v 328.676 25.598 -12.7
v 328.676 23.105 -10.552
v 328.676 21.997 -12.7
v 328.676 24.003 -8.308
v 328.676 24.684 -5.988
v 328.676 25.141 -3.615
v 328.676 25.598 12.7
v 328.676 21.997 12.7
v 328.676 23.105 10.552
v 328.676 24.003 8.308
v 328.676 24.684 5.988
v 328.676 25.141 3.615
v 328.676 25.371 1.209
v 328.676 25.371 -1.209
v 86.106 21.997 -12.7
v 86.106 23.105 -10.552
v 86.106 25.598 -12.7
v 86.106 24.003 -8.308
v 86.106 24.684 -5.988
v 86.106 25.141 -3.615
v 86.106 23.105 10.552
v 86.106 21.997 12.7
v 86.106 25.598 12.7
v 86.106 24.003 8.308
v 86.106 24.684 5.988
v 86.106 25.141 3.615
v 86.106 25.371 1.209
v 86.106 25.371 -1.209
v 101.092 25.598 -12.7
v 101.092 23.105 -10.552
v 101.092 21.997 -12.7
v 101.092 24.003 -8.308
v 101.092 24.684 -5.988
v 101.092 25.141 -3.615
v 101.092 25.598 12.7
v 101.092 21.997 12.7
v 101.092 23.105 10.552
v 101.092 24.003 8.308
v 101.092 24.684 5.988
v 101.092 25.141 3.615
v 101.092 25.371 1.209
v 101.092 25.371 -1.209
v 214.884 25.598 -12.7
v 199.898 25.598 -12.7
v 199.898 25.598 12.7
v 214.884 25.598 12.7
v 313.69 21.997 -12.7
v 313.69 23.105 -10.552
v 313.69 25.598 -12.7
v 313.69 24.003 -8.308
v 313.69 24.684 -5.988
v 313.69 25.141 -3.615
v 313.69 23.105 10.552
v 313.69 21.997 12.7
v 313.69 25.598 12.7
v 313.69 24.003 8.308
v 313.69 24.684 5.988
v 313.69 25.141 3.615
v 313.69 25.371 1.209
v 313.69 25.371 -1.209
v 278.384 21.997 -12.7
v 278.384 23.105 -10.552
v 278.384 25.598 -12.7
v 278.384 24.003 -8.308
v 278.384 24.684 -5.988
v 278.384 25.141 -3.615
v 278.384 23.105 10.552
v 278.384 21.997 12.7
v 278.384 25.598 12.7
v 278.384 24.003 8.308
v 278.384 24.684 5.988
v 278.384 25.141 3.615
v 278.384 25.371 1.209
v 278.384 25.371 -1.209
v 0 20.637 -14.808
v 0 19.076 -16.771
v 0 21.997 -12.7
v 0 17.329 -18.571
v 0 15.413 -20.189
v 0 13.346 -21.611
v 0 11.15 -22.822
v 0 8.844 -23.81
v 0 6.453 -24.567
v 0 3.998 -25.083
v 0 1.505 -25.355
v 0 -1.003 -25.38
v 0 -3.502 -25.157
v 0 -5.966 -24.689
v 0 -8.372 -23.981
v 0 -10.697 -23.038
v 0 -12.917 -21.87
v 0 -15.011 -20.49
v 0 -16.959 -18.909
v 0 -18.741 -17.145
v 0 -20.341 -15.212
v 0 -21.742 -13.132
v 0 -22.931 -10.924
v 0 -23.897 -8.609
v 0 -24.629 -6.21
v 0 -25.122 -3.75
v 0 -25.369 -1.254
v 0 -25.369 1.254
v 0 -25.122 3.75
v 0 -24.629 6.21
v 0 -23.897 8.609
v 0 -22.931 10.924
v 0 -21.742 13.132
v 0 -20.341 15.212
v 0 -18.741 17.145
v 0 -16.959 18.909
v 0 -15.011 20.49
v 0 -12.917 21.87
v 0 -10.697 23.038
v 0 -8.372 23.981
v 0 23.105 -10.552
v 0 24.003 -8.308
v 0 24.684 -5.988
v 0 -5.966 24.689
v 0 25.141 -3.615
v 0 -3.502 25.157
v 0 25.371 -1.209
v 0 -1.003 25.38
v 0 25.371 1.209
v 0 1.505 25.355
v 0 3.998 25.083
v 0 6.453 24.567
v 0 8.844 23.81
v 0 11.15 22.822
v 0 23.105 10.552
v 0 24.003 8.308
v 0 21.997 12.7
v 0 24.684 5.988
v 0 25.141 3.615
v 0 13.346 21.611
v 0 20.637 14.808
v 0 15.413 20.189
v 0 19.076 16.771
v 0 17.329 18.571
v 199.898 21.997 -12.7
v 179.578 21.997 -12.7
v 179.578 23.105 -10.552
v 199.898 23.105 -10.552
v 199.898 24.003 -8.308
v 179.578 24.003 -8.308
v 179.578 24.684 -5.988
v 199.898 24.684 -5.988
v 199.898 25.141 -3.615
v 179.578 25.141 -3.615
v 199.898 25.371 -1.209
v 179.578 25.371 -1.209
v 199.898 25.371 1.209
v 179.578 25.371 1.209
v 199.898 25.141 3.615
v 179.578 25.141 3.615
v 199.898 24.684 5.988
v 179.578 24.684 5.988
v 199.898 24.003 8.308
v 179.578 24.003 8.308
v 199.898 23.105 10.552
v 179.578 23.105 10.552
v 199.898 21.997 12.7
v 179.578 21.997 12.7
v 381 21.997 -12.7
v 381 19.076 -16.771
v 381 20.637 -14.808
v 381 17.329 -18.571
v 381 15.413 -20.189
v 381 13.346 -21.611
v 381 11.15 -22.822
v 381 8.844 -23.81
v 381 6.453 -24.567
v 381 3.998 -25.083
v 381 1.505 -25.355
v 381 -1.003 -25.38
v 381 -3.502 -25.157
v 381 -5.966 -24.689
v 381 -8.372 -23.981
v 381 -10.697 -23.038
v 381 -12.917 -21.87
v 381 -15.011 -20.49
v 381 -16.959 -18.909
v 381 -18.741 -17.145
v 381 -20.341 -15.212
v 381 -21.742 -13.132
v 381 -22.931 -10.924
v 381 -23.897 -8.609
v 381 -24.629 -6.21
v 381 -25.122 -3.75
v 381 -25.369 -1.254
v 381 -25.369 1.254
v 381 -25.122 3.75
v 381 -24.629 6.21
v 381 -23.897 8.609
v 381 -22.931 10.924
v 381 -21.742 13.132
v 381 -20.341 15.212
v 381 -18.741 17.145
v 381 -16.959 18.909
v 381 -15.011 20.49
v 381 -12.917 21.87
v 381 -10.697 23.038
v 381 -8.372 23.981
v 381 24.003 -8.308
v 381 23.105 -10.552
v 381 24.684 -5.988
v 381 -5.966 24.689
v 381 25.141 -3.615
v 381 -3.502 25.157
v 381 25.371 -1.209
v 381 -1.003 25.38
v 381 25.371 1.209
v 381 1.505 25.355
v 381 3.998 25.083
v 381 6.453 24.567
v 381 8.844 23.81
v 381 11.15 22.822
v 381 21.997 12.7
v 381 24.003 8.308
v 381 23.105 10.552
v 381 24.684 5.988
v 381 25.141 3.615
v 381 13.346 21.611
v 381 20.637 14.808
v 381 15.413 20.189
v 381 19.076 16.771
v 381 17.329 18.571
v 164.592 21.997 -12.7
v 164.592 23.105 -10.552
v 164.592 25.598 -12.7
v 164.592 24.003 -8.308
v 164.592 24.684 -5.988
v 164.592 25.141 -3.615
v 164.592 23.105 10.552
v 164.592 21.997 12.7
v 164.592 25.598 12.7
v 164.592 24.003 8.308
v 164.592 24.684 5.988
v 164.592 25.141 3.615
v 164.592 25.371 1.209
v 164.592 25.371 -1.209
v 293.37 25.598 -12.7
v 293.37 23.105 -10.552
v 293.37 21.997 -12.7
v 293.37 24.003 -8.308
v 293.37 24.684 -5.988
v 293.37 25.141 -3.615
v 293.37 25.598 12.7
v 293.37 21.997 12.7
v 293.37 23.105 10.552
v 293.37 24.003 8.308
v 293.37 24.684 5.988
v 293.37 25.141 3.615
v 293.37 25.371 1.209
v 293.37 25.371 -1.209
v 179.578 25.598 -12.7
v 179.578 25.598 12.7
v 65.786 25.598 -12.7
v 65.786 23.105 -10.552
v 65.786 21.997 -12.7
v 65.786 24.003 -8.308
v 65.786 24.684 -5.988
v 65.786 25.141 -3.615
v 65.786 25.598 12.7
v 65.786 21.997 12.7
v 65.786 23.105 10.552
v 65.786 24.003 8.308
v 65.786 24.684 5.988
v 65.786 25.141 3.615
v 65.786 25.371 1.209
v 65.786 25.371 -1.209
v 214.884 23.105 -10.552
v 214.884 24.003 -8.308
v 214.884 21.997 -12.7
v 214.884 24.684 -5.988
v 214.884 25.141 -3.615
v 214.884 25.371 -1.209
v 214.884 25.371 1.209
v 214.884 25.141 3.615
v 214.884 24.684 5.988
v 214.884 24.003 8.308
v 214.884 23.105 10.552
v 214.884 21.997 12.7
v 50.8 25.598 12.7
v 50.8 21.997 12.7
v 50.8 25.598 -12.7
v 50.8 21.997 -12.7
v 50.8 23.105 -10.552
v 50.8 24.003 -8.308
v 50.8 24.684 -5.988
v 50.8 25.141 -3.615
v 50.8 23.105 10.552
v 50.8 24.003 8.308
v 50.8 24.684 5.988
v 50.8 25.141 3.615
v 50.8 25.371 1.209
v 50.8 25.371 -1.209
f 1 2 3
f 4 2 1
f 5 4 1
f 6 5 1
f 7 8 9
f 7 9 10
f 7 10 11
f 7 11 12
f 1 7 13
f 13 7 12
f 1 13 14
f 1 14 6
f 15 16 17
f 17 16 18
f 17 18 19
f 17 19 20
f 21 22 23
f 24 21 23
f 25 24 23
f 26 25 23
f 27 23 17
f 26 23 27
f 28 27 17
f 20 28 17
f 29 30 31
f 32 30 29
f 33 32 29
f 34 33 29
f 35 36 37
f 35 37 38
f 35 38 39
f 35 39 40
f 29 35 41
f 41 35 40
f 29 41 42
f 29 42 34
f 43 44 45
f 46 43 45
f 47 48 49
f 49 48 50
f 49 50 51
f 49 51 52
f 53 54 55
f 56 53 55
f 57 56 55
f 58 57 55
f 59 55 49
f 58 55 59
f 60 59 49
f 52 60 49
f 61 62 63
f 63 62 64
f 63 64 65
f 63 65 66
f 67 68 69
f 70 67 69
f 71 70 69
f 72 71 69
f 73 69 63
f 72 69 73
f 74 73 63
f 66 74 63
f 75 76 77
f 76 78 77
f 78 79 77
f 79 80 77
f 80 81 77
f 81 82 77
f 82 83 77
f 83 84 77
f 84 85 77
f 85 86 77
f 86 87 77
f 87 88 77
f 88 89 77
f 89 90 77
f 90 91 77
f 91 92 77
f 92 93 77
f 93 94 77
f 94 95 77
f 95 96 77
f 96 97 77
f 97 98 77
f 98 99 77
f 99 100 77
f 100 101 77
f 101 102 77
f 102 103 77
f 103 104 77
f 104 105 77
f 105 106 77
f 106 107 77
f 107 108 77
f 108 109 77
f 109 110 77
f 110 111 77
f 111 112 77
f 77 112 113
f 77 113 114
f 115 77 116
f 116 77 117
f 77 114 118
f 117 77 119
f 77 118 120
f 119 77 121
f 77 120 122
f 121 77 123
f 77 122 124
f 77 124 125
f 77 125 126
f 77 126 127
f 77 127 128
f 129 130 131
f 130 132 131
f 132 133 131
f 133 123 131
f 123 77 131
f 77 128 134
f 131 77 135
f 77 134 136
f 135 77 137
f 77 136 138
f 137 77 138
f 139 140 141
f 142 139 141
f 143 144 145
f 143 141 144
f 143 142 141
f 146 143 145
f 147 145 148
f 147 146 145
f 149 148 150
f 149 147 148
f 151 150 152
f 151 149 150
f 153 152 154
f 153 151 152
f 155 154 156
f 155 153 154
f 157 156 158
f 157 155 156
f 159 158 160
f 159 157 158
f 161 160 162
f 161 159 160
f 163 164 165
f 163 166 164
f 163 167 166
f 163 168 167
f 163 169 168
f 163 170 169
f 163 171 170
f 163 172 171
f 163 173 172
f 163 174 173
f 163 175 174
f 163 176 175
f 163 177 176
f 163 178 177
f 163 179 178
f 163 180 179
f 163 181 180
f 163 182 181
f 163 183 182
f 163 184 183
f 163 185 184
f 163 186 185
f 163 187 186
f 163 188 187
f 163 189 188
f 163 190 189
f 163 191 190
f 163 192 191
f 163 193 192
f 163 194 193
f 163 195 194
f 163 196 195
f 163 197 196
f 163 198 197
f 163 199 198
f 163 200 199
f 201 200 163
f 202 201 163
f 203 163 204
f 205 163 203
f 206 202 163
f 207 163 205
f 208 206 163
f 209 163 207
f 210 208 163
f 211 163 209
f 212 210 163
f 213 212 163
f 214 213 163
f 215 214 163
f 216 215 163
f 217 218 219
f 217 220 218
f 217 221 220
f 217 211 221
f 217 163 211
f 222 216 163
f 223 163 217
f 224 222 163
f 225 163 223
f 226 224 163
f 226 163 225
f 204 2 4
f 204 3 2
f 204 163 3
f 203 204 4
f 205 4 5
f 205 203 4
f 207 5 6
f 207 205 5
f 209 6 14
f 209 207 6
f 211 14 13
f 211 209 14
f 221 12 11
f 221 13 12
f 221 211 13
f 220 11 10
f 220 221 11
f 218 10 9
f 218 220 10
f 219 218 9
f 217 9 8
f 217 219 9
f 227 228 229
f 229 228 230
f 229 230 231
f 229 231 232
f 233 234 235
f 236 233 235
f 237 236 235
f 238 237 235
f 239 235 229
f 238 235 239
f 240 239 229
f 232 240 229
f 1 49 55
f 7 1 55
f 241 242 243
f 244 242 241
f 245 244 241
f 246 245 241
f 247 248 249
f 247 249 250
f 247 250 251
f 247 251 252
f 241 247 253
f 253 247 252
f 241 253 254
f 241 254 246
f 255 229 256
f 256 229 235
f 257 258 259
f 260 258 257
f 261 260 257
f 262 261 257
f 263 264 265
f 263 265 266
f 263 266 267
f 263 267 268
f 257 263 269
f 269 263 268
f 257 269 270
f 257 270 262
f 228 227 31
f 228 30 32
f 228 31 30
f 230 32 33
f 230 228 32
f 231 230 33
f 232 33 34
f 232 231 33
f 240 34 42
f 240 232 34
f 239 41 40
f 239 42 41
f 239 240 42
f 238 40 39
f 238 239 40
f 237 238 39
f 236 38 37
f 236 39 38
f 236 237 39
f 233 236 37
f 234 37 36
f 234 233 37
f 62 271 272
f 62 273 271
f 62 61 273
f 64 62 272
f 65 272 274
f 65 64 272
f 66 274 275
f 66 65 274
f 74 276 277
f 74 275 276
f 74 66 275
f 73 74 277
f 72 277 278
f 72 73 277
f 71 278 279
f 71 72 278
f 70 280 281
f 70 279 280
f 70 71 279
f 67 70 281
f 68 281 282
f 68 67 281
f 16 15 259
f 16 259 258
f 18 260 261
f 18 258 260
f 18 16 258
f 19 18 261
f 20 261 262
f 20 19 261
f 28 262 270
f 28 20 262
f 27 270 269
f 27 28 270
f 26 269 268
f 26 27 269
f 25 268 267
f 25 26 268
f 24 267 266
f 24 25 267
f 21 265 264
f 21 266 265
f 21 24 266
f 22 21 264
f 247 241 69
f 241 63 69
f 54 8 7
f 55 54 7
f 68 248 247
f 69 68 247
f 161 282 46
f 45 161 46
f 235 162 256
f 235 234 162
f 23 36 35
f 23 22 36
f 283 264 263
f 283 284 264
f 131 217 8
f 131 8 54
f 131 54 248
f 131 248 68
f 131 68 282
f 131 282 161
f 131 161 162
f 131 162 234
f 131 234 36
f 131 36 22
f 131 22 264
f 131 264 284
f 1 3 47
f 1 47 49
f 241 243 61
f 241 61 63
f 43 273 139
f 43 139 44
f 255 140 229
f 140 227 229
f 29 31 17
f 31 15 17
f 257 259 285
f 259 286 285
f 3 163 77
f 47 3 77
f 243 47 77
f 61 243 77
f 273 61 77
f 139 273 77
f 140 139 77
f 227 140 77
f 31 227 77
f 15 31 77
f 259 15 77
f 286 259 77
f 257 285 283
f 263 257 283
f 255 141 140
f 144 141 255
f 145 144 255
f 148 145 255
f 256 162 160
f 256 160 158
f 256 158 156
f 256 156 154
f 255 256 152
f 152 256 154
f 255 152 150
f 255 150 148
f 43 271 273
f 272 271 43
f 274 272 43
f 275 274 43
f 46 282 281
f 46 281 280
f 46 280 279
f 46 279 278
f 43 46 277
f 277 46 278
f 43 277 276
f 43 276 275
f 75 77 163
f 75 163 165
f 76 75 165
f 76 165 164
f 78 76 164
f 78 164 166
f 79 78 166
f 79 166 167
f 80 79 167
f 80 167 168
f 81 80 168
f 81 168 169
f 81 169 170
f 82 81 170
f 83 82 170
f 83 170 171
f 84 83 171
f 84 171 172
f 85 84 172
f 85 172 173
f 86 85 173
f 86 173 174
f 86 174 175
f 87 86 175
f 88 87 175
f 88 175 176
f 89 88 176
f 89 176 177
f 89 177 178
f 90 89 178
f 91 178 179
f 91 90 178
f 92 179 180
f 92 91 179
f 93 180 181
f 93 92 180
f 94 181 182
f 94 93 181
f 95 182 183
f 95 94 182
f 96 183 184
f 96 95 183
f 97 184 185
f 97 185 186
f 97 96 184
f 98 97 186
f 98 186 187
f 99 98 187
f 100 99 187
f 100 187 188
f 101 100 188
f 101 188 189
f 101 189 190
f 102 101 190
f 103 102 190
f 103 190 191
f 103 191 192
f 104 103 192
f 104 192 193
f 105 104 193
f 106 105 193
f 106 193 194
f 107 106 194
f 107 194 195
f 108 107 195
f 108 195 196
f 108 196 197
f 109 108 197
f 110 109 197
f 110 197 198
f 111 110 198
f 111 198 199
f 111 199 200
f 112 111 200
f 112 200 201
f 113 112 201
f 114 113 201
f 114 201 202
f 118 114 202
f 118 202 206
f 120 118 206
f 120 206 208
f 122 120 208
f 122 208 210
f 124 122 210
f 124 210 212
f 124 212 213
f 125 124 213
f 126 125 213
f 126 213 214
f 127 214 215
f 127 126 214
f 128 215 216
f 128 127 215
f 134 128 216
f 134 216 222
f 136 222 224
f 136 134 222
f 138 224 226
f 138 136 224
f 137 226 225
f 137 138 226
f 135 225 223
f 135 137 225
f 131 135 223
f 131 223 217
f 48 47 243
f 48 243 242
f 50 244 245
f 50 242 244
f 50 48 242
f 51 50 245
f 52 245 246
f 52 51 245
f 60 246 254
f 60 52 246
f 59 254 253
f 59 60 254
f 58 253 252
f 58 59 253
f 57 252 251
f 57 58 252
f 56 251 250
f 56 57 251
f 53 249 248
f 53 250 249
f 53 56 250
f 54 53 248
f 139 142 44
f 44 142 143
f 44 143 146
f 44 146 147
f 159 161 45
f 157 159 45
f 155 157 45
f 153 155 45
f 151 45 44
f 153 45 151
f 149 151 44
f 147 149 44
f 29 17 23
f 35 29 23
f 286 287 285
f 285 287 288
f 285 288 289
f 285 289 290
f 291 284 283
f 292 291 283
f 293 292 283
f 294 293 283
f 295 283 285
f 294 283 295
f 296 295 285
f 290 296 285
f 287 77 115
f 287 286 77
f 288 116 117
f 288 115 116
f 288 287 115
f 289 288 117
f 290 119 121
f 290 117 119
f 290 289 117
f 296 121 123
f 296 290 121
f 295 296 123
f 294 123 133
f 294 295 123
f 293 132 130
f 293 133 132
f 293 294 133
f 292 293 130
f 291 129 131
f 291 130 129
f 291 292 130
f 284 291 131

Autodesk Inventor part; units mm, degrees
ref_plane "YZ Plane" through (0, 0, 0) normal (1, 0, 0) x (0, 1, 0)
ref_plane "XZ Plane" through (0, 0, 0) normal (0, 1, 0) x (-1, 0, 0)
ref_plane "XY Plane" through (0, 0, 0) normal (0, 0, 1) x (1, 0, 0)
sketch "Sketch1" plane through (0, 0, 0) normal (0, 0, 1) x (1, 0, 0)
  line L0 (0, 0) -> (381, 0)
  line L1 (0, 0) -> (0, 25.4)
  line L2 (0, 25.4) -> (50.8, 25.4)
  line L3 (50.8, 25.4) -> (50.8, 28.575)
  line L4 (50.8, 28.575) -> (65.786, 28.575)
  line L5 (65.786, 28.575) -> (65.786, 25.4)
  line L6 (65.786, 25.4) -> (86.106, 25.4)
  line L7 (86.106, 25.4) -> (86.106, 28.575)
  line L8 (86.106, 28.575) -> (101.092, 28.575)
  line L9 (101.092, 28.575) -> (101.092, 25.4)
  line L10 (101.092, 25.4) -> (164.592, 25.4)
  line L11 (164.592, 28.575) -> (179.578, 28.575)
  line L12 (179.578, 28.575) -> (179.578, 25.4)
  line L13 (179.578, 25.4) -> (199.898, 25.4)
  line L14 (199.898, 25.4) -> (199.898, 28.575)
  line L15 (199.898, 28.575) -> (214.884, 28.575)
  line L16 (214.884, 28.575) -> (214.884, 25.4)
  line L17 (214.884, 25.4) -> (278.384, 25.4)
  line L18 (278.384, 28.575) -> (293.37, 28.575)
  line L19 (293.37, 28.575) -> (293.37, 25.4)
  line L20 (293.37, 25.4) -> (313.69, 25.4)
  line L21 (313.69, 25.4) -> (313.69, 28.575)
  line L22 (313.69, 28.575) -> (328.676, 28.575)
  line L23 (328.676, 28.575) -> (328.676, 25.4)
  line L24 (328.676, 25.4) -> (379.476, 25.4)
  line L25 (164.592, 28.575) -> (164.592, 25.4)
  line L26 (278.384, 28.575) -> (278.384, 25.4)
  line L27 (379.476, 25.4) -> (381, 25.4)
  line L28 (381, 25.4) -> (381, 0)
  dimension "d0" = 381
  dimension "d1" = 25.4
  dimension "d2" = 50.8
  dimension "d3" = 3.175
  dimension "d4" = 14.986
  dimension "d5" = 20.32
  dimension "d6" = 14.986
  dimension "d7" = 63.5
  dimension "d8" = 14.986
  dimension "d9" = 20.32
  dimension "d10" = 14.986
  dimension "d11" = 63.5
  dimension "d12" = 14.986
  dimension "d13" = 20.32
  dimension "d14" = 14.986
  dimension "d15" = 50.8
revolve "Revolution1" add sketch "Sketch1" angle 360 about axis through (0, 0, 0) along (1, 0, 0)
sketch "Sketch2" plane through (381, 0, 0) normal (1, 0, 0) x (0, 0, -1)
  circle A0 centre (0, 0) radius 28.575
  arc A1 (-12.8501, 21.8127) -> (12.8501, 21.9887) centre (0.1501, -0.0084) ccw
  line L0 (28.575, -0.0084) -> (28.6569, -0.0084) construction
  line L1 (28.5738, -0.2635) -> (28.6458, -0.2635) construction
  line L2 (12.8501, 21.9887) -> (12.8501, 25.5227)
  line L3 (-12.8501, 21.8127) -> (-12.8501, 25.5227)
  line L4 (12.8501, 25.5227) -> (-12.8501, 25.5227)
sketch "Sketch3" plane through (0, 0, 0) normal (-1, 0, 0) x (0, 0, 1)
  circle A0 centre (0, 0) radius 28.575
  arc A1 (-12.7, 21.997) -> (12.7, 21.997) centre (0, 0) ccw
  circle A2 centre (0, 0) radius 28.575 projected
  line L0 (-12.7, 21.997) -> (-12.7, 25.5977)
  line L1 (12.7, 21.997) -> (12.7, 25.5977)
  line L2 (-12.7, 25.5977) -> (12.7, 25.5977)
  dimension "d23" = 57.15
  dimension "d24" = 50.8
extrude "Extrusion1" cut sketch "Sketch3" against normal blind 381 contours A0 L0 A1 L1 | L2 A0
properties part number "Eje"
